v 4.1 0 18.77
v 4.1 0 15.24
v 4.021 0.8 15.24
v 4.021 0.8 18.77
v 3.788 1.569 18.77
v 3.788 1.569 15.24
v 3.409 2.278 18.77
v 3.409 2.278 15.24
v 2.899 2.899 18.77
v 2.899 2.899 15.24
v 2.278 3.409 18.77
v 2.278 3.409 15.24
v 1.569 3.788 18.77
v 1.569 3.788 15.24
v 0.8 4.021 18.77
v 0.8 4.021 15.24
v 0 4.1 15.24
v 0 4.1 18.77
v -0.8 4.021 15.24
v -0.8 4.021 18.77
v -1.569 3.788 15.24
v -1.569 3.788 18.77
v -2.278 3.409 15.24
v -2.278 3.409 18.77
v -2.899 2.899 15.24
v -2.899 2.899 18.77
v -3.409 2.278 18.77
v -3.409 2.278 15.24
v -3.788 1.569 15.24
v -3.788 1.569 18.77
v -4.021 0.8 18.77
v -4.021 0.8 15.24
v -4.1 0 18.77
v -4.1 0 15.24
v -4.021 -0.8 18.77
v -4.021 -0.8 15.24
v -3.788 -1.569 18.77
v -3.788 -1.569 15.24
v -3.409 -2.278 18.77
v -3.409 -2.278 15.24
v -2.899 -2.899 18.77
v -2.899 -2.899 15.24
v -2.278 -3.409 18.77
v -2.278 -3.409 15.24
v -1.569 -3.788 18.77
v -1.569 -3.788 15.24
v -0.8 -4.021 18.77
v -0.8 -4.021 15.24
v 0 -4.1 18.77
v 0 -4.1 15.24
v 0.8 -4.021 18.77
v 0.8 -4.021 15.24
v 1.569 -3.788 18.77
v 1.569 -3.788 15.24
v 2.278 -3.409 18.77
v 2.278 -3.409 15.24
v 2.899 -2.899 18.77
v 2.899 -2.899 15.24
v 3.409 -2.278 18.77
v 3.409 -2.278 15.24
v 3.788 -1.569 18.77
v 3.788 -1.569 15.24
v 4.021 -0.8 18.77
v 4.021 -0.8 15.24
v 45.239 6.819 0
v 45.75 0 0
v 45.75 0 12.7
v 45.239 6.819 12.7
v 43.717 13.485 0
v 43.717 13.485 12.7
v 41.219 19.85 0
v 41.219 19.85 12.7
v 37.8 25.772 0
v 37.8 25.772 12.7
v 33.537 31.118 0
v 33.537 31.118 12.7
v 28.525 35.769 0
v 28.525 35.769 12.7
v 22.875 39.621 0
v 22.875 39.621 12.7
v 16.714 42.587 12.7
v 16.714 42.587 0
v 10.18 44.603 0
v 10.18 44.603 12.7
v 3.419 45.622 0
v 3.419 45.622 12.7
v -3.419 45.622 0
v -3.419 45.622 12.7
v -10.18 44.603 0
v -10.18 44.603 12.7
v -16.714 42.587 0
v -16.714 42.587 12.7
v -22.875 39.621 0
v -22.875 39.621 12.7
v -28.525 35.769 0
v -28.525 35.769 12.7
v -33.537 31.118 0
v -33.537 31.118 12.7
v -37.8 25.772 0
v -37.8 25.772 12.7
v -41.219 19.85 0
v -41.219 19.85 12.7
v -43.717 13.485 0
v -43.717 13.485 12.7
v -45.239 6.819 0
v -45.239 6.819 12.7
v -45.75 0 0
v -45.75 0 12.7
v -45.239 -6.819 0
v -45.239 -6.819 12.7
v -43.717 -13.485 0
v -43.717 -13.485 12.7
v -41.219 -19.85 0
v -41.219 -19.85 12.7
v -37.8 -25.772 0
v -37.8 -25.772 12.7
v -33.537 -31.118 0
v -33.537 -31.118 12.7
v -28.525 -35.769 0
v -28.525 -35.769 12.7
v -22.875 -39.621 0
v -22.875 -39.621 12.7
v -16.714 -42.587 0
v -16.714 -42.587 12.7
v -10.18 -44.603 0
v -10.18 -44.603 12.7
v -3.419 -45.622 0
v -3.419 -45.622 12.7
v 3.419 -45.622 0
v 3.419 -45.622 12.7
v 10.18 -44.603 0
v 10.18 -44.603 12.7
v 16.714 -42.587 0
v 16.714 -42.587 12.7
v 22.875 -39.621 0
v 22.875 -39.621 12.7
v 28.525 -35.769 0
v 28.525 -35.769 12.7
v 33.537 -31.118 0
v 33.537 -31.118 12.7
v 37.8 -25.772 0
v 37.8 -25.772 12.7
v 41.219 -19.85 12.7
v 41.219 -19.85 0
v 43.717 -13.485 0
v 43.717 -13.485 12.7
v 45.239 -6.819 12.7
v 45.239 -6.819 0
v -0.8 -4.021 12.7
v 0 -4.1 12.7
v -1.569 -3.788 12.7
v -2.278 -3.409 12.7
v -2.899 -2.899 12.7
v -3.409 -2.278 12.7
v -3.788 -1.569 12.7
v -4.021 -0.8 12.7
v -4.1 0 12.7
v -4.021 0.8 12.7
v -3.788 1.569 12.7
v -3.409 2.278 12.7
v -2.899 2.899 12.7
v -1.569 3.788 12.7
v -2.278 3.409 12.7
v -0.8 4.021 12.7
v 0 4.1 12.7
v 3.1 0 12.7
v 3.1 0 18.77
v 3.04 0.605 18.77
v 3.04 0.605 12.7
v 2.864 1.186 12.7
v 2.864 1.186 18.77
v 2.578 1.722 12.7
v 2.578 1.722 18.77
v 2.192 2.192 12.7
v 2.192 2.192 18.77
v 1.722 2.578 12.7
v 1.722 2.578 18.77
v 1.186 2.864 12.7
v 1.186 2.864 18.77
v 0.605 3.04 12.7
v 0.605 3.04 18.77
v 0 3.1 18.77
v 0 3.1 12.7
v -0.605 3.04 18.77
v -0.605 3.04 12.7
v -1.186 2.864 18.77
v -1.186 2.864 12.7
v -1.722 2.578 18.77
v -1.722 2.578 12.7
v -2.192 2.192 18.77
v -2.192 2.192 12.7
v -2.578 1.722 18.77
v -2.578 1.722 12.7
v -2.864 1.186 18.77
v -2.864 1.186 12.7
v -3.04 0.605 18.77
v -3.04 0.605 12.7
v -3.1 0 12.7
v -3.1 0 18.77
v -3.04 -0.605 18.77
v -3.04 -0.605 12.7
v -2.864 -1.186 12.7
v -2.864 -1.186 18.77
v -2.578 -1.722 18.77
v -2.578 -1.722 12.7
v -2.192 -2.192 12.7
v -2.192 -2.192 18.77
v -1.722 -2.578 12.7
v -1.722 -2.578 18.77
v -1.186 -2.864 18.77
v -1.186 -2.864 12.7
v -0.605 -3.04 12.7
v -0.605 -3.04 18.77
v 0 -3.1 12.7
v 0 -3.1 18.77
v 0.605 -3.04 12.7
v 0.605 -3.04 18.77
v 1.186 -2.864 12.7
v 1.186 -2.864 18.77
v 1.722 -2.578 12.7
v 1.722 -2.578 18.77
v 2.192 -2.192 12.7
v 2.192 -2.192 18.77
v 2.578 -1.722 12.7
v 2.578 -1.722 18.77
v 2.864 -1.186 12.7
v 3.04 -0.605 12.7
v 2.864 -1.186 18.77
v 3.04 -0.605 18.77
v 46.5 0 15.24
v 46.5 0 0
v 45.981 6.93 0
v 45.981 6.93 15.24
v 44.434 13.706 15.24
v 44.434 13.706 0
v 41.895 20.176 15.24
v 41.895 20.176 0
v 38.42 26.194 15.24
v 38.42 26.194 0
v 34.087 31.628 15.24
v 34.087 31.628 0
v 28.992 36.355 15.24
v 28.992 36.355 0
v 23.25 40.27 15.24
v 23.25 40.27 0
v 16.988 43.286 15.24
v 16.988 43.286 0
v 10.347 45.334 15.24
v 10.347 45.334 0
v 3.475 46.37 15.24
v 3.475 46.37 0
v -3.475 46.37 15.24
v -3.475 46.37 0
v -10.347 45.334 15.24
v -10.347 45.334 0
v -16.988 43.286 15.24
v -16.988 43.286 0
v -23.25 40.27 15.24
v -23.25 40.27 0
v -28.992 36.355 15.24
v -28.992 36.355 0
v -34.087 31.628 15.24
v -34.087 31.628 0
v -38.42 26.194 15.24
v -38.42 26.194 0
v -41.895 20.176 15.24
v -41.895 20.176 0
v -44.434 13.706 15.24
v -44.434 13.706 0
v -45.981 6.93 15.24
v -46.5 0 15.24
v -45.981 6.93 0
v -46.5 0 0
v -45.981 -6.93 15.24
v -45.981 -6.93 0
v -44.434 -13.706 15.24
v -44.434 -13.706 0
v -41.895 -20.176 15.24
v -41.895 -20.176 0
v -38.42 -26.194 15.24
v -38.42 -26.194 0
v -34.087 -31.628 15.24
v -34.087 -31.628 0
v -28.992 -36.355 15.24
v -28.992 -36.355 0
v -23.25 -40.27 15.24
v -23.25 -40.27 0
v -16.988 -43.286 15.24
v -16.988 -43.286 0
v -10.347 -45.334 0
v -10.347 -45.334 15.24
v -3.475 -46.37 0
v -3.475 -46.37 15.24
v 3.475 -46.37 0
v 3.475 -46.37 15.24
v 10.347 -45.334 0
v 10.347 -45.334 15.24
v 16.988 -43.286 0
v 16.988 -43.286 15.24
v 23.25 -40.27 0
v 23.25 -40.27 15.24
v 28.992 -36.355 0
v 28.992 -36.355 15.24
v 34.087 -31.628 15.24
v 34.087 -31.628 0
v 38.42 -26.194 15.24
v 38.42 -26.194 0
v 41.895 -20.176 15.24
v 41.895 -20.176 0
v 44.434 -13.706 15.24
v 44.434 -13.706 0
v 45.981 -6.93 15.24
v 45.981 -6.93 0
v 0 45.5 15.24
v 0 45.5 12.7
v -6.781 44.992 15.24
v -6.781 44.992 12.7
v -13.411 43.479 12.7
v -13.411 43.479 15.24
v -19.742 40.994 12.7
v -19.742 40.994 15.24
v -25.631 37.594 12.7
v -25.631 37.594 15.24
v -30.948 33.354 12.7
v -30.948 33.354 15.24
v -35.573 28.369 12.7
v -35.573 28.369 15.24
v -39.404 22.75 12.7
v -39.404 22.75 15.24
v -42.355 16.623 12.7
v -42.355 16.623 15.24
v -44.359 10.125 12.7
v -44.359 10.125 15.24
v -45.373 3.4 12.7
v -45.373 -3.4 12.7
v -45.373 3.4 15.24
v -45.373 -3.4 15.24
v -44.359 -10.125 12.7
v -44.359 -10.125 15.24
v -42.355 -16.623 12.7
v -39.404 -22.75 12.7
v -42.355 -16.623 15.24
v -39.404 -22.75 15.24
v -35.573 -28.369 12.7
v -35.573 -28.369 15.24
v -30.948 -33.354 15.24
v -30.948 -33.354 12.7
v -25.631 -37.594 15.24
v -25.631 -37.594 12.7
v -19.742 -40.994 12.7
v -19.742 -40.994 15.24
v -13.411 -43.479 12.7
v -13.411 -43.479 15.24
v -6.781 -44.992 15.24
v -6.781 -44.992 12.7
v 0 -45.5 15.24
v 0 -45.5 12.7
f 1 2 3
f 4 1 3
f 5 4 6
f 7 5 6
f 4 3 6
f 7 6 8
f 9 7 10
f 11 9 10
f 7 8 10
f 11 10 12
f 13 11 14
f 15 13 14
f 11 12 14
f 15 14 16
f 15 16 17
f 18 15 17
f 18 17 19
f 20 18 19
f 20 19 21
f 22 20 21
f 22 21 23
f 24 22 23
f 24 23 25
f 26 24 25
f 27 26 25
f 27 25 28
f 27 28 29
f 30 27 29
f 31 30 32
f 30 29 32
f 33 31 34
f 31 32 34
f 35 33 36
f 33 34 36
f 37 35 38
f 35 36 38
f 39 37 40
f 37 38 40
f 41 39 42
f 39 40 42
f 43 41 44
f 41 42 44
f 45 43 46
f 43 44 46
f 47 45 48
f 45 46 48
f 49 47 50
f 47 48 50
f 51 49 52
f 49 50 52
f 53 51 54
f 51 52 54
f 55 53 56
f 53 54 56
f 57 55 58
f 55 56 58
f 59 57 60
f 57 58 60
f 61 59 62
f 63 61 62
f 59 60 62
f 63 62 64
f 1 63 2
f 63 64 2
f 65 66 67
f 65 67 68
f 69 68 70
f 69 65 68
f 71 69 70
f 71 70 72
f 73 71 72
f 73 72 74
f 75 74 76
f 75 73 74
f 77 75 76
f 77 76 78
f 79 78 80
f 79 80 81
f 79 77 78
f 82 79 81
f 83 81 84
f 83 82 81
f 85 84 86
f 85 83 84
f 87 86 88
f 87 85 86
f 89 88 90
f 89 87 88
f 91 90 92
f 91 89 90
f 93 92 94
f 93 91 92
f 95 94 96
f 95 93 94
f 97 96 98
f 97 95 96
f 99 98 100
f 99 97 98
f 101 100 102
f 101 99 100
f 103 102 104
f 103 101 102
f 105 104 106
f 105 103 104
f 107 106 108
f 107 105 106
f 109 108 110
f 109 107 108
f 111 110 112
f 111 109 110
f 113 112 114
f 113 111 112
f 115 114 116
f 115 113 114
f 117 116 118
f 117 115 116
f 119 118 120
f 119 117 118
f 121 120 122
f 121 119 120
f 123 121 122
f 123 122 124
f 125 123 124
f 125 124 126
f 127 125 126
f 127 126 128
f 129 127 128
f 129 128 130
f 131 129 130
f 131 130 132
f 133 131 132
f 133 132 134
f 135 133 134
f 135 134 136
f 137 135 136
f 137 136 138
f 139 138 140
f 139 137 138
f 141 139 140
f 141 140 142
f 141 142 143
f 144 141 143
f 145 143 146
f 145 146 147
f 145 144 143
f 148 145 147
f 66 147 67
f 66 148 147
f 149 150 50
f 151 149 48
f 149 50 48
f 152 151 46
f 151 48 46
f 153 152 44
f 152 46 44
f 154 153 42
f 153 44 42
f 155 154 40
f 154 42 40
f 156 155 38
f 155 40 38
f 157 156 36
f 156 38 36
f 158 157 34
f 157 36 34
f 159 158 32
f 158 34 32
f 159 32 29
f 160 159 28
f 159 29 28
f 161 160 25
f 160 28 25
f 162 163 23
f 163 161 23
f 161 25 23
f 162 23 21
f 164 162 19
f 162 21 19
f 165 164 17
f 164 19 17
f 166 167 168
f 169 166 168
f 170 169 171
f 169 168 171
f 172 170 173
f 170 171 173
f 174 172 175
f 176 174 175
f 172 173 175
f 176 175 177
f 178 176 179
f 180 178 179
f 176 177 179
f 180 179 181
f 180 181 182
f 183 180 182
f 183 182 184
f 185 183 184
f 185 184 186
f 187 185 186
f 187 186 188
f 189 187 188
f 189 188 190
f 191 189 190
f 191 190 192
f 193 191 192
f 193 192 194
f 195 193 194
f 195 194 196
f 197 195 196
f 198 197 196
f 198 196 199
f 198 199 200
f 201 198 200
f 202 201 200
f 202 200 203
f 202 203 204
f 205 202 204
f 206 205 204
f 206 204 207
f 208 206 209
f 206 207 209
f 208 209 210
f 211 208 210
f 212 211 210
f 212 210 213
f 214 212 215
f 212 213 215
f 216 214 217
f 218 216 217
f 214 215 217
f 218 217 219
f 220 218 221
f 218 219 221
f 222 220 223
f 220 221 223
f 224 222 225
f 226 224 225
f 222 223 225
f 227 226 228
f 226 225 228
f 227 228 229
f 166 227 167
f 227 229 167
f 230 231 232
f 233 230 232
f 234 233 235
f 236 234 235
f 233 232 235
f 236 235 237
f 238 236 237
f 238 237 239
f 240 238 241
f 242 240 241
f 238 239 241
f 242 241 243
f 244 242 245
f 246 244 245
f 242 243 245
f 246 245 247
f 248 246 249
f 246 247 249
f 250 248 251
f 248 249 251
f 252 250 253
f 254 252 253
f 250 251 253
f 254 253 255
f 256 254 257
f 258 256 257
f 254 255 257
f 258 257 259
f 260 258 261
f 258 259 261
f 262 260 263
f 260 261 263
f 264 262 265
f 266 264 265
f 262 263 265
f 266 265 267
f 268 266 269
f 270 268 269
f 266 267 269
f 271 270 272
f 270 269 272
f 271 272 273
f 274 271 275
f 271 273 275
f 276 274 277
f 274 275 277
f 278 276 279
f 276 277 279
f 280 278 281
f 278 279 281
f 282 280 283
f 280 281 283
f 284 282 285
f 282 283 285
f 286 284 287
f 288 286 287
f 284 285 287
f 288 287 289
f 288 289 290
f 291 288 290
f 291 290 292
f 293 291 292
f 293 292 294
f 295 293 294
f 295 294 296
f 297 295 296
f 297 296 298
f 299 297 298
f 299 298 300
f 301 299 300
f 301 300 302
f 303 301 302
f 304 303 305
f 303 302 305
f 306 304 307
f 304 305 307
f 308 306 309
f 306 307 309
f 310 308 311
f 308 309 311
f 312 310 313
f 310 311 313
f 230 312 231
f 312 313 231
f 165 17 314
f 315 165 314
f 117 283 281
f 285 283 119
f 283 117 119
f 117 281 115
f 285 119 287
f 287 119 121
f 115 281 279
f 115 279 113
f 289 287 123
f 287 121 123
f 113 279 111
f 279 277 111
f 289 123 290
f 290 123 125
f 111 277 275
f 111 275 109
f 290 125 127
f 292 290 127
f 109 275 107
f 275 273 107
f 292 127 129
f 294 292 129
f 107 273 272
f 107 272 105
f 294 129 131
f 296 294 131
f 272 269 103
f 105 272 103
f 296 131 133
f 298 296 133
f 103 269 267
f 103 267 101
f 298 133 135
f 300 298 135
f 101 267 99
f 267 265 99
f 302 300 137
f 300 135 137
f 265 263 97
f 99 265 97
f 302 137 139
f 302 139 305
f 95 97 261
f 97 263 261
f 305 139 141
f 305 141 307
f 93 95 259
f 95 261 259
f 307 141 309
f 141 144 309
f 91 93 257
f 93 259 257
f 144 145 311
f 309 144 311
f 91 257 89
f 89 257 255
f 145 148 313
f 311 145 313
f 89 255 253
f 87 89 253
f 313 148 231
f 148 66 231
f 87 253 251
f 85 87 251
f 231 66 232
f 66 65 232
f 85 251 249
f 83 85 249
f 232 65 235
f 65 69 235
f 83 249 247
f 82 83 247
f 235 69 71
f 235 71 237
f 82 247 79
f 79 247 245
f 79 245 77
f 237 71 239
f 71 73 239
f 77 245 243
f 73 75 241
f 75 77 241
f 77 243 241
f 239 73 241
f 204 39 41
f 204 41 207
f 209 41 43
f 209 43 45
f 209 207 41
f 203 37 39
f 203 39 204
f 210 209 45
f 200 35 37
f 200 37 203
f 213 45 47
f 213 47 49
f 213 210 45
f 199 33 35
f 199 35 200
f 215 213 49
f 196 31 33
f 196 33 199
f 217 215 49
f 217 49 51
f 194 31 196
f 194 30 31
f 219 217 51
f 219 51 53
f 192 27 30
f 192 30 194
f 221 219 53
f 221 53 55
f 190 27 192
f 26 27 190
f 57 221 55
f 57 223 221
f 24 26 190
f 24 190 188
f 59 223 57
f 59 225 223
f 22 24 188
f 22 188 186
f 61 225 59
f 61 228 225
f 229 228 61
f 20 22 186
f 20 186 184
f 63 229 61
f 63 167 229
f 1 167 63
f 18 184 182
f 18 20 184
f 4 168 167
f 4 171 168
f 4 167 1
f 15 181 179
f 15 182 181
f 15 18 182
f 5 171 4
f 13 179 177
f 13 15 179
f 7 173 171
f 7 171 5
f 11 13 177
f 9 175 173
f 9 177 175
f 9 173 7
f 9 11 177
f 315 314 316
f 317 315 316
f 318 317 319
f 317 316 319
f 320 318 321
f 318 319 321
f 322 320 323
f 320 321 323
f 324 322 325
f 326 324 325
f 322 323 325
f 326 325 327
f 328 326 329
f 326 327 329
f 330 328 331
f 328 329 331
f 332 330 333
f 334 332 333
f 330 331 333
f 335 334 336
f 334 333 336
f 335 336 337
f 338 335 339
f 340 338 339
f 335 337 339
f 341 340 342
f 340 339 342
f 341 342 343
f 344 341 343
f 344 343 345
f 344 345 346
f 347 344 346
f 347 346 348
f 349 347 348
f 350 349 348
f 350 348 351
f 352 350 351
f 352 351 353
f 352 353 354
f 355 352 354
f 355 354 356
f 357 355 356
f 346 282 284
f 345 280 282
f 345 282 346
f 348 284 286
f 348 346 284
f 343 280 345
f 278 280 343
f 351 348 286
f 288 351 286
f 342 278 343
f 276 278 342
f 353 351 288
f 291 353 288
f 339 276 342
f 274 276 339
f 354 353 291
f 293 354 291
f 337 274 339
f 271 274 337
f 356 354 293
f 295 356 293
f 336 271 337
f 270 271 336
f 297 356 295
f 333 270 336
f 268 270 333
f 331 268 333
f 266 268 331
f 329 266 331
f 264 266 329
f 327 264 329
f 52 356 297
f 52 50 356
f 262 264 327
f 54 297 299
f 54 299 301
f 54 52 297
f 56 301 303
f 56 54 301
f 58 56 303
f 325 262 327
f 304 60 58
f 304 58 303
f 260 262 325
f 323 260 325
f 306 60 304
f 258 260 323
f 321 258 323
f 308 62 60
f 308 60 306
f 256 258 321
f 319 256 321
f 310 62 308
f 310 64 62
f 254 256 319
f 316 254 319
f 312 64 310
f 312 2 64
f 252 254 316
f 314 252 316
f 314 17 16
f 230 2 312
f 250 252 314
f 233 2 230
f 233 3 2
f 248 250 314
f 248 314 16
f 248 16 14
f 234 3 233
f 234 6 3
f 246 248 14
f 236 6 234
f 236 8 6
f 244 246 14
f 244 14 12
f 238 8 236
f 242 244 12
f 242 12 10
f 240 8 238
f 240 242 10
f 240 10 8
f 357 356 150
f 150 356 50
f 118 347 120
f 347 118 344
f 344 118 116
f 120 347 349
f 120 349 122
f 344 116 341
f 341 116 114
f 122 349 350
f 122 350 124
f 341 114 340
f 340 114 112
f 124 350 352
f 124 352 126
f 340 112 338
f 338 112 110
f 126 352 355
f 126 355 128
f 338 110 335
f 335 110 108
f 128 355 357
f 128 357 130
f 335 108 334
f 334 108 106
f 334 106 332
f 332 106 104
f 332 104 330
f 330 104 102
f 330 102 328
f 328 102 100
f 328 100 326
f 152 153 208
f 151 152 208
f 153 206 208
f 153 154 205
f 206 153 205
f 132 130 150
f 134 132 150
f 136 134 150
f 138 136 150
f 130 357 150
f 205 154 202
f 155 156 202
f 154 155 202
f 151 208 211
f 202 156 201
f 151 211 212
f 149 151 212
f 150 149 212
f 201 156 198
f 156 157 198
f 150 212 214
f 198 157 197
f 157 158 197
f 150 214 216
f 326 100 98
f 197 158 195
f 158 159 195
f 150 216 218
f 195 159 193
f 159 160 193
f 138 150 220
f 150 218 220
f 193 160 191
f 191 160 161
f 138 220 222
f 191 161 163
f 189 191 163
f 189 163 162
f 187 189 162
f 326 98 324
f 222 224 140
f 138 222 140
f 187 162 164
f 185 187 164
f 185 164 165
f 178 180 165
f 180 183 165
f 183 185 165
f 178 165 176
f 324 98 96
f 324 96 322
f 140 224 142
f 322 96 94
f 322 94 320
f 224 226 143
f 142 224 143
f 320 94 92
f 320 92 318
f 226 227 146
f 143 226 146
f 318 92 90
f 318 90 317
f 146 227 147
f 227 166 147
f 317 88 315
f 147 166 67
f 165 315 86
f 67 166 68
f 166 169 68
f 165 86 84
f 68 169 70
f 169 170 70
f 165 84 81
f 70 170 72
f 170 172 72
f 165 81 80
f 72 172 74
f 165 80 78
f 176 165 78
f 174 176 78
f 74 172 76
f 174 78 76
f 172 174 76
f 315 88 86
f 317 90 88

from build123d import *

# Parameters (mm, degrees)
F0_R          = 46.5
F1_DEPTH      = 15.24
F2_R          = 45.75
F3_DEPTH      = 12.7
F4_R          = 4.1
F5_DEPTH      = 3.53
F5_DEPTH_BACK = 1
F7_R          = 3.1
F8_DEPTH      = 18.771
F9_DEPTH      = 15.241


# Not quite as in the source:
# - after a boolean that leaves OpenCascade's solid faulty, fix() repairs it


with BuildPart() as f1:
    # F0 (on Top) → F1 (new body)
    with BuildSketch(Plane.XY):
        Circle(F0_R)
    extrude(amount=F1_DEPTH)

    # F2 (on Top) → F3 (cut)
    with BuildSketch(Plane.XY):
        Circle(F2_R)
    extrude(amount=F3_DEPTH, mode=Mode.SUBTRACT)

    # F4 (on face) → F5 (join, two sides)
    with BuildSketch(Plane.XY.offset(15.24)) as f5_sk:
        Circle(F4_R)
    extrude(amount=F5_DEPTH)
    extrude(f5_sk.sketch, amount=-F5_DEPTH_BACK)

    # F7 (on face) → F8 (cut, through all)
    with BuildSketch(Plane.XY.offset(18.77)):
        Circle(F7_R)
    extrude(amount=-F8_DEPTH, mode=Mode.SUBTRACT)

    # F6 (on face) → F9 (cut, through all)
    with BuildSketch(Plane.XY.offset(15.24)):
        with BuildLine():
            Line((0, 4.1), (0, 45.5))
            ThreePointArc((0, 45.5), (-45.5, 0), (0, -45.5))
            Line((0, -45.5), (0, -4.1))
            ThreePointArc((0, -4.1), (-4.1, 0), (0, 4.1))
        make_face()
    extrude(amount=-F9_DEPTH, mode=Mode.SUBTRACT)

    add(f1.part.fix(), mode=Mode.REPLACE)


solid = f1.part
